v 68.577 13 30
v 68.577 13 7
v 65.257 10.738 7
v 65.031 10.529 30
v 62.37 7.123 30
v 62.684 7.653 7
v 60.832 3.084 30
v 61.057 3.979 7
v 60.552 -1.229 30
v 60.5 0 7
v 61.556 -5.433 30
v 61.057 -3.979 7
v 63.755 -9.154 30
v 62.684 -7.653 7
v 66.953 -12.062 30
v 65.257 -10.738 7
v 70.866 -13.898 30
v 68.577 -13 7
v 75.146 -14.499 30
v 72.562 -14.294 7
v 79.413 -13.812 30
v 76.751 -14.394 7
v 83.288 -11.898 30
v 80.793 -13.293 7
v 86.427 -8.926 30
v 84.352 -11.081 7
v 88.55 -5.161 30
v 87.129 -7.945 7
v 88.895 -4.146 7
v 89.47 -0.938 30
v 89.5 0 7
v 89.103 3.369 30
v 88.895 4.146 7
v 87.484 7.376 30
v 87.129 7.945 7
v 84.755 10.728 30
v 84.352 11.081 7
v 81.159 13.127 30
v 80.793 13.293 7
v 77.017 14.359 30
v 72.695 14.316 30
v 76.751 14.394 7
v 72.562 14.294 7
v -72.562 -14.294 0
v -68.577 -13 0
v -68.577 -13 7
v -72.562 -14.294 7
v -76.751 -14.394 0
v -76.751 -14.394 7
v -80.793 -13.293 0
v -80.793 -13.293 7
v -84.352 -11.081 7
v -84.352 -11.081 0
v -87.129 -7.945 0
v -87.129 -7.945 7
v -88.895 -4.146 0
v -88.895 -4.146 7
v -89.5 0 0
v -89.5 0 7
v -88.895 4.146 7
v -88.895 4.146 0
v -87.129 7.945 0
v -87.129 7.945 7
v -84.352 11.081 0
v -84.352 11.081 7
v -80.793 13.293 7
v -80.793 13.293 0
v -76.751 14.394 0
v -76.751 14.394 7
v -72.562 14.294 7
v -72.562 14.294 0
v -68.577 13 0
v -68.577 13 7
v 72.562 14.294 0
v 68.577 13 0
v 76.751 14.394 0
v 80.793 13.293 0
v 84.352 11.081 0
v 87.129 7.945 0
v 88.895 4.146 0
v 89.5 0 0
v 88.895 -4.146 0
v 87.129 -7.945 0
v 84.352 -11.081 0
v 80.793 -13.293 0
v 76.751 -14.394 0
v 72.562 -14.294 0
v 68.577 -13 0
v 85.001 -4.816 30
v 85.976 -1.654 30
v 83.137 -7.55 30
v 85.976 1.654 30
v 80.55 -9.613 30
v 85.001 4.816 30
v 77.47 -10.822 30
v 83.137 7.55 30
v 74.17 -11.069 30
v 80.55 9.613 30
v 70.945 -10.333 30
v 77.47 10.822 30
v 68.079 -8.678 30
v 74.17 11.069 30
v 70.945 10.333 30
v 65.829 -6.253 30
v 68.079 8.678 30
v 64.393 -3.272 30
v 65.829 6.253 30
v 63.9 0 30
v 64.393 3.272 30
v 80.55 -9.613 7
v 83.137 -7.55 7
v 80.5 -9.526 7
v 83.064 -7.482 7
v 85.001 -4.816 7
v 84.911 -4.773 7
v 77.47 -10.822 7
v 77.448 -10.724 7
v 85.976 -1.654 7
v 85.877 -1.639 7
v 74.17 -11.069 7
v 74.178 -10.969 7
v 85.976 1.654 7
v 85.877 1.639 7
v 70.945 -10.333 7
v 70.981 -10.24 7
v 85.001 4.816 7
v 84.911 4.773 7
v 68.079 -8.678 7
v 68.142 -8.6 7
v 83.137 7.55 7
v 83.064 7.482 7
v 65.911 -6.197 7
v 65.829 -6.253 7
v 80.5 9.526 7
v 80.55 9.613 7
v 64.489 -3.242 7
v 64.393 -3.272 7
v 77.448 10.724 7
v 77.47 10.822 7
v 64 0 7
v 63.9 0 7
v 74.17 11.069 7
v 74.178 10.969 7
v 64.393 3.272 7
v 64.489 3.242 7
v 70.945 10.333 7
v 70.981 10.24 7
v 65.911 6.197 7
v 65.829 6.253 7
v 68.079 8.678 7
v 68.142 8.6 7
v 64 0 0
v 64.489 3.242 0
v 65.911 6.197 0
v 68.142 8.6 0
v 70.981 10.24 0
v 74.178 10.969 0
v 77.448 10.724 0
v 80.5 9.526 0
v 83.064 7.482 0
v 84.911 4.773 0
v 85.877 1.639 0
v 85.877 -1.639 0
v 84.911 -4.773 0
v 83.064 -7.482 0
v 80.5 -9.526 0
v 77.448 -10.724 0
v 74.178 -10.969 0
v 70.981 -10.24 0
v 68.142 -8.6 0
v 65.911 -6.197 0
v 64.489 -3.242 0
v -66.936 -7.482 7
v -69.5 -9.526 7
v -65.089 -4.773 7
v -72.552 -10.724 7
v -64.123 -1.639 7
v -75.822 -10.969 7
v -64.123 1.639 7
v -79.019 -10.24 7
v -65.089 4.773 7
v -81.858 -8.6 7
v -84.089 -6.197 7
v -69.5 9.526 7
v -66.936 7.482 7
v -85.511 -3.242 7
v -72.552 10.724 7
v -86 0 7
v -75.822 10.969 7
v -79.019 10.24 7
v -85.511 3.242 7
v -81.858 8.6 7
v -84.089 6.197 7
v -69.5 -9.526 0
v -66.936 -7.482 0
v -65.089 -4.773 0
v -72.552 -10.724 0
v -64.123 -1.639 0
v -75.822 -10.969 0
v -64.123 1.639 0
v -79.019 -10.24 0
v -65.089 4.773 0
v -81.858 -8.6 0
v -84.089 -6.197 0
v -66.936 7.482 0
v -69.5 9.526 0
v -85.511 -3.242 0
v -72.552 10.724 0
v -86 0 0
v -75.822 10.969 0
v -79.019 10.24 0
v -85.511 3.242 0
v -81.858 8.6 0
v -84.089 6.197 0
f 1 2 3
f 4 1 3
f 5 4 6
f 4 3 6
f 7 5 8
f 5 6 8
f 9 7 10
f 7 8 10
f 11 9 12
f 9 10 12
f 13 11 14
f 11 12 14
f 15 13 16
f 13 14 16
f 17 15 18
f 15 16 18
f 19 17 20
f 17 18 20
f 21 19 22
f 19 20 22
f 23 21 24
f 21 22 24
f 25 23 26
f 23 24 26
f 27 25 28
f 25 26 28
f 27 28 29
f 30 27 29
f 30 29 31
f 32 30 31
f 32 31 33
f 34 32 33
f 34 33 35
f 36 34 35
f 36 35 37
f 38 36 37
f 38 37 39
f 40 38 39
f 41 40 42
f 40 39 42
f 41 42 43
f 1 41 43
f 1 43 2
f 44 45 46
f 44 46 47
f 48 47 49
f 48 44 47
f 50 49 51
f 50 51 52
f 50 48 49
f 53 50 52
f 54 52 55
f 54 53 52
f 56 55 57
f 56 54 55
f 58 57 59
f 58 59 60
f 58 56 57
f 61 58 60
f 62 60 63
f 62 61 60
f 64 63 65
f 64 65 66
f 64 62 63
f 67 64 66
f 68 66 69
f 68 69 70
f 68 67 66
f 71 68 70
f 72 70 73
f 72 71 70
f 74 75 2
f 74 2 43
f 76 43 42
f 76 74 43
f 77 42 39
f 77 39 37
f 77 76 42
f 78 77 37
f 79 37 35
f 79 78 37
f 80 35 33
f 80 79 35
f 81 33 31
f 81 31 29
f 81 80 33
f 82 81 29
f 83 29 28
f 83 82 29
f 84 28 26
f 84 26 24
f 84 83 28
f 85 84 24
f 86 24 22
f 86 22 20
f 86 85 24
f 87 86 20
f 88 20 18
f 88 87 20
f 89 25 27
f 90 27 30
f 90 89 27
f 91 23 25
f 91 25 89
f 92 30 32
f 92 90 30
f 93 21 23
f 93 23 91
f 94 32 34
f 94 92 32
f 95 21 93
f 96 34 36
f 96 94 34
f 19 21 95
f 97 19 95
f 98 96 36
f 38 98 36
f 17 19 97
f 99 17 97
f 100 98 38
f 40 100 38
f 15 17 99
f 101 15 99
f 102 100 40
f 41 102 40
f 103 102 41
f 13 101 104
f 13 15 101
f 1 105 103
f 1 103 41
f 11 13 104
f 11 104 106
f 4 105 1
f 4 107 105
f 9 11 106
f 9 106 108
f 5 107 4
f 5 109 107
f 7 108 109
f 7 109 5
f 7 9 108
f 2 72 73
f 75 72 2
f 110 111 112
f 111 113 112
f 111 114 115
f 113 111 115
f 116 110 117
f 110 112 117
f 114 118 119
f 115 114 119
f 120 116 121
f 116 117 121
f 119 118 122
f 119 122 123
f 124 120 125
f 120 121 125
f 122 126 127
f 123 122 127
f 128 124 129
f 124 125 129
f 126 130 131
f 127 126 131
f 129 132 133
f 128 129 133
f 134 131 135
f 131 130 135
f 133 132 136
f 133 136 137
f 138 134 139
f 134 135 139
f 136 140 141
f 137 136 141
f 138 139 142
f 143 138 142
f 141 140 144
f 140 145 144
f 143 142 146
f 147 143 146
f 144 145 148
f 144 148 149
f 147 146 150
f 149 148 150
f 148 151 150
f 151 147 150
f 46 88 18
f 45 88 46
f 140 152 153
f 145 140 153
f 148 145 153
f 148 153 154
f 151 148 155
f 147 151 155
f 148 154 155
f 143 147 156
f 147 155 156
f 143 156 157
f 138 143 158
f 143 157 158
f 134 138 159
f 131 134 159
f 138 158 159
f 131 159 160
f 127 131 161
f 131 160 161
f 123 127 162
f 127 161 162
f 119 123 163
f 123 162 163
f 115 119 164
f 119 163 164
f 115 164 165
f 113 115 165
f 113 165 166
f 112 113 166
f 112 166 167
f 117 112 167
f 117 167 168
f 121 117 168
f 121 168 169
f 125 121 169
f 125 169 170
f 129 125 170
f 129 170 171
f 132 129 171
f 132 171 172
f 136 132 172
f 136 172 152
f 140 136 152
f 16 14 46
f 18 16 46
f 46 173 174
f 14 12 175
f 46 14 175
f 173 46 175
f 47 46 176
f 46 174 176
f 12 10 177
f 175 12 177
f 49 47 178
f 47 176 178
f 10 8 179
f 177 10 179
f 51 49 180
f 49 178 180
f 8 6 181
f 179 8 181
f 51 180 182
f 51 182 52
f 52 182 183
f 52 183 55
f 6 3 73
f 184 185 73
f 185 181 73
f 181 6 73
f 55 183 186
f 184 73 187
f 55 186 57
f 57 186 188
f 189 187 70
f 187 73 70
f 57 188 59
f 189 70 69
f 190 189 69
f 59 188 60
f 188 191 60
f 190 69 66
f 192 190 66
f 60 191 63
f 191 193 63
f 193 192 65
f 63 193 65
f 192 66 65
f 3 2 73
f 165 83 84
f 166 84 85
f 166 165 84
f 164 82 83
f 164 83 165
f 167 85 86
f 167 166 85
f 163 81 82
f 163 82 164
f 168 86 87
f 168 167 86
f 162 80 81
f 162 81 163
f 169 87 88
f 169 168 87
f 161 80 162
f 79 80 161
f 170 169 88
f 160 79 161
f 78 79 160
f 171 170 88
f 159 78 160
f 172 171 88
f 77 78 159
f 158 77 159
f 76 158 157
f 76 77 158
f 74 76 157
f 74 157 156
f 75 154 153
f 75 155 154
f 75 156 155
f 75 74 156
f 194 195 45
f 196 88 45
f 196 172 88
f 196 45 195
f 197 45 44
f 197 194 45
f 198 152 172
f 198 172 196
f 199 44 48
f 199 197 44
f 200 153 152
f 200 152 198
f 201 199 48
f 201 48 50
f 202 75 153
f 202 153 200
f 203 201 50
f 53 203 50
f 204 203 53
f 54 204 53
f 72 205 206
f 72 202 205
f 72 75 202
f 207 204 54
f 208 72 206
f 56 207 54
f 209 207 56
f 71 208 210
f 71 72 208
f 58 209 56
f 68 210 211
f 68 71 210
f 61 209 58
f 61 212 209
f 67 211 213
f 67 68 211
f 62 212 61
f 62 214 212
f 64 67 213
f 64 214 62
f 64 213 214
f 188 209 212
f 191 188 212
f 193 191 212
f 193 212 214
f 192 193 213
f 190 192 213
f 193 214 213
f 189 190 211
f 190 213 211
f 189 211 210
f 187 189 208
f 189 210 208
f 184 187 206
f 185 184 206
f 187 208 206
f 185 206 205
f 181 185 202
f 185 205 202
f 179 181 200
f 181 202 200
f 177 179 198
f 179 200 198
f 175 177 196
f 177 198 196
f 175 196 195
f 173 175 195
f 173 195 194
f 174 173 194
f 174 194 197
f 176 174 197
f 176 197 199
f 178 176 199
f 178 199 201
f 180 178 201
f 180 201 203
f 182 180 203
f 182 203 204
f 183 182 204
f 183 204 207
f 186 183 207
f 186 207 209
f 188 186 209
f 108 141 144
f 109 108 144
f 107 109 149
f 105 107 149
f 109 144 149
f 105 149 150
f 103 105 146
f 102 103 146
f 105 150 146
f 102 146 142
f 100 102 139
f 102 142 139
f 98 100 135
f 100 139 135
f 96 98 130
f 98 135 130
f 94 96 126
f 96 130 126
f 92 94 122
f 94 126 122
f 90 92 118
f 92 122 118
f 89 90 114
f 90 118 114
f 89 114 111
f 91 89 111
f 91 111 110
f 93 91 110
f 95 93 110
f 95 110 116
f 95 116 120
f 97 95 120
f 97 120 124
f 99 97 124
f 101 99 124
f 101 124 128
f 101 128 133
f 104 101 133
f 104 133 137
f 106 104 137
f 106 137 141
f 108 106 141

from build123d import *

# Parameters (mm, degrees)
BOSS_EXTRUDE1_DEPTH = 7
SKETCH2_R           = 14.5
BOSS_EXTRUDE2_DEPTH = 23
SKETCH3_R           = 11
CUT_EXTRUDE1_DEPTH  = 96.501308892
CUT_EXTRUDE2_START  = -7
SKETCH4_R           = 11.1
CUT_EXTRUDE2_DEPTH  = 89.501308892


with BuildPart() as part:
    # Sketch1 → Boss-Extrude1 (new body)
    with BuildSketch(Plane.XY):
        with BuildLine():
            Line((-68.577383711, 13), (68.577383711, 13))
            ThreePointArc((68.577383711, 13), (89.5, 0), (68.577383711, -13))
            Line((68.577383711, -13), (-68.577383711, -13))
            ThreePointArc((-68.577383711, -13), (-89.5, 0), (-68.577383711, 13))
        make_face()
    extrude(amount=BOSS_EXTRUDE1_DEPTH)

    # Sketch2 → Boss-Extrude2 (add)
    with BuildSketch(Plane.XY.offset(7)):
        with Locations(Location((75, 0, 0), (0, 0, 116.291555275))):
            Circle(SKETCH2_R)
    extrude(amount=BOSS_EXTRUDE2_DEPTH)

    # Sketch3 → Cut-Extrude1 (cut, through all)
    with BuildSketch(Plane(origin=(0, 0, 0), x_dir=(-1, 0, 0), z_dir=(0, 0, -1))):
        with Locations((-75, 0)):
            Circle(SKETCH3_R)
        with Locations((75, 0)):
            Circle(SKETCH3_R)
    extrude(amount=-CUT_EXTRUDE1_DEPTH, mode=Mode.SUBTRACT)

    # Sketch4 → Cut-Extrude2 (cut, through all)
    with BuildSketch(Plane(origin=(0, 0, 0), x_dir=(-1, 0, 0), z_dir=(0, 0, -1)).offset(CUT_EXTRUDE2_START)):
        with Locations((-75, 0)):
            Circle(SKETCH4_R)
    extrude(amount=-CUT_EXTRUDE2_DEPTH, mode=Mode.SUBTRACT)


solid = part.part
